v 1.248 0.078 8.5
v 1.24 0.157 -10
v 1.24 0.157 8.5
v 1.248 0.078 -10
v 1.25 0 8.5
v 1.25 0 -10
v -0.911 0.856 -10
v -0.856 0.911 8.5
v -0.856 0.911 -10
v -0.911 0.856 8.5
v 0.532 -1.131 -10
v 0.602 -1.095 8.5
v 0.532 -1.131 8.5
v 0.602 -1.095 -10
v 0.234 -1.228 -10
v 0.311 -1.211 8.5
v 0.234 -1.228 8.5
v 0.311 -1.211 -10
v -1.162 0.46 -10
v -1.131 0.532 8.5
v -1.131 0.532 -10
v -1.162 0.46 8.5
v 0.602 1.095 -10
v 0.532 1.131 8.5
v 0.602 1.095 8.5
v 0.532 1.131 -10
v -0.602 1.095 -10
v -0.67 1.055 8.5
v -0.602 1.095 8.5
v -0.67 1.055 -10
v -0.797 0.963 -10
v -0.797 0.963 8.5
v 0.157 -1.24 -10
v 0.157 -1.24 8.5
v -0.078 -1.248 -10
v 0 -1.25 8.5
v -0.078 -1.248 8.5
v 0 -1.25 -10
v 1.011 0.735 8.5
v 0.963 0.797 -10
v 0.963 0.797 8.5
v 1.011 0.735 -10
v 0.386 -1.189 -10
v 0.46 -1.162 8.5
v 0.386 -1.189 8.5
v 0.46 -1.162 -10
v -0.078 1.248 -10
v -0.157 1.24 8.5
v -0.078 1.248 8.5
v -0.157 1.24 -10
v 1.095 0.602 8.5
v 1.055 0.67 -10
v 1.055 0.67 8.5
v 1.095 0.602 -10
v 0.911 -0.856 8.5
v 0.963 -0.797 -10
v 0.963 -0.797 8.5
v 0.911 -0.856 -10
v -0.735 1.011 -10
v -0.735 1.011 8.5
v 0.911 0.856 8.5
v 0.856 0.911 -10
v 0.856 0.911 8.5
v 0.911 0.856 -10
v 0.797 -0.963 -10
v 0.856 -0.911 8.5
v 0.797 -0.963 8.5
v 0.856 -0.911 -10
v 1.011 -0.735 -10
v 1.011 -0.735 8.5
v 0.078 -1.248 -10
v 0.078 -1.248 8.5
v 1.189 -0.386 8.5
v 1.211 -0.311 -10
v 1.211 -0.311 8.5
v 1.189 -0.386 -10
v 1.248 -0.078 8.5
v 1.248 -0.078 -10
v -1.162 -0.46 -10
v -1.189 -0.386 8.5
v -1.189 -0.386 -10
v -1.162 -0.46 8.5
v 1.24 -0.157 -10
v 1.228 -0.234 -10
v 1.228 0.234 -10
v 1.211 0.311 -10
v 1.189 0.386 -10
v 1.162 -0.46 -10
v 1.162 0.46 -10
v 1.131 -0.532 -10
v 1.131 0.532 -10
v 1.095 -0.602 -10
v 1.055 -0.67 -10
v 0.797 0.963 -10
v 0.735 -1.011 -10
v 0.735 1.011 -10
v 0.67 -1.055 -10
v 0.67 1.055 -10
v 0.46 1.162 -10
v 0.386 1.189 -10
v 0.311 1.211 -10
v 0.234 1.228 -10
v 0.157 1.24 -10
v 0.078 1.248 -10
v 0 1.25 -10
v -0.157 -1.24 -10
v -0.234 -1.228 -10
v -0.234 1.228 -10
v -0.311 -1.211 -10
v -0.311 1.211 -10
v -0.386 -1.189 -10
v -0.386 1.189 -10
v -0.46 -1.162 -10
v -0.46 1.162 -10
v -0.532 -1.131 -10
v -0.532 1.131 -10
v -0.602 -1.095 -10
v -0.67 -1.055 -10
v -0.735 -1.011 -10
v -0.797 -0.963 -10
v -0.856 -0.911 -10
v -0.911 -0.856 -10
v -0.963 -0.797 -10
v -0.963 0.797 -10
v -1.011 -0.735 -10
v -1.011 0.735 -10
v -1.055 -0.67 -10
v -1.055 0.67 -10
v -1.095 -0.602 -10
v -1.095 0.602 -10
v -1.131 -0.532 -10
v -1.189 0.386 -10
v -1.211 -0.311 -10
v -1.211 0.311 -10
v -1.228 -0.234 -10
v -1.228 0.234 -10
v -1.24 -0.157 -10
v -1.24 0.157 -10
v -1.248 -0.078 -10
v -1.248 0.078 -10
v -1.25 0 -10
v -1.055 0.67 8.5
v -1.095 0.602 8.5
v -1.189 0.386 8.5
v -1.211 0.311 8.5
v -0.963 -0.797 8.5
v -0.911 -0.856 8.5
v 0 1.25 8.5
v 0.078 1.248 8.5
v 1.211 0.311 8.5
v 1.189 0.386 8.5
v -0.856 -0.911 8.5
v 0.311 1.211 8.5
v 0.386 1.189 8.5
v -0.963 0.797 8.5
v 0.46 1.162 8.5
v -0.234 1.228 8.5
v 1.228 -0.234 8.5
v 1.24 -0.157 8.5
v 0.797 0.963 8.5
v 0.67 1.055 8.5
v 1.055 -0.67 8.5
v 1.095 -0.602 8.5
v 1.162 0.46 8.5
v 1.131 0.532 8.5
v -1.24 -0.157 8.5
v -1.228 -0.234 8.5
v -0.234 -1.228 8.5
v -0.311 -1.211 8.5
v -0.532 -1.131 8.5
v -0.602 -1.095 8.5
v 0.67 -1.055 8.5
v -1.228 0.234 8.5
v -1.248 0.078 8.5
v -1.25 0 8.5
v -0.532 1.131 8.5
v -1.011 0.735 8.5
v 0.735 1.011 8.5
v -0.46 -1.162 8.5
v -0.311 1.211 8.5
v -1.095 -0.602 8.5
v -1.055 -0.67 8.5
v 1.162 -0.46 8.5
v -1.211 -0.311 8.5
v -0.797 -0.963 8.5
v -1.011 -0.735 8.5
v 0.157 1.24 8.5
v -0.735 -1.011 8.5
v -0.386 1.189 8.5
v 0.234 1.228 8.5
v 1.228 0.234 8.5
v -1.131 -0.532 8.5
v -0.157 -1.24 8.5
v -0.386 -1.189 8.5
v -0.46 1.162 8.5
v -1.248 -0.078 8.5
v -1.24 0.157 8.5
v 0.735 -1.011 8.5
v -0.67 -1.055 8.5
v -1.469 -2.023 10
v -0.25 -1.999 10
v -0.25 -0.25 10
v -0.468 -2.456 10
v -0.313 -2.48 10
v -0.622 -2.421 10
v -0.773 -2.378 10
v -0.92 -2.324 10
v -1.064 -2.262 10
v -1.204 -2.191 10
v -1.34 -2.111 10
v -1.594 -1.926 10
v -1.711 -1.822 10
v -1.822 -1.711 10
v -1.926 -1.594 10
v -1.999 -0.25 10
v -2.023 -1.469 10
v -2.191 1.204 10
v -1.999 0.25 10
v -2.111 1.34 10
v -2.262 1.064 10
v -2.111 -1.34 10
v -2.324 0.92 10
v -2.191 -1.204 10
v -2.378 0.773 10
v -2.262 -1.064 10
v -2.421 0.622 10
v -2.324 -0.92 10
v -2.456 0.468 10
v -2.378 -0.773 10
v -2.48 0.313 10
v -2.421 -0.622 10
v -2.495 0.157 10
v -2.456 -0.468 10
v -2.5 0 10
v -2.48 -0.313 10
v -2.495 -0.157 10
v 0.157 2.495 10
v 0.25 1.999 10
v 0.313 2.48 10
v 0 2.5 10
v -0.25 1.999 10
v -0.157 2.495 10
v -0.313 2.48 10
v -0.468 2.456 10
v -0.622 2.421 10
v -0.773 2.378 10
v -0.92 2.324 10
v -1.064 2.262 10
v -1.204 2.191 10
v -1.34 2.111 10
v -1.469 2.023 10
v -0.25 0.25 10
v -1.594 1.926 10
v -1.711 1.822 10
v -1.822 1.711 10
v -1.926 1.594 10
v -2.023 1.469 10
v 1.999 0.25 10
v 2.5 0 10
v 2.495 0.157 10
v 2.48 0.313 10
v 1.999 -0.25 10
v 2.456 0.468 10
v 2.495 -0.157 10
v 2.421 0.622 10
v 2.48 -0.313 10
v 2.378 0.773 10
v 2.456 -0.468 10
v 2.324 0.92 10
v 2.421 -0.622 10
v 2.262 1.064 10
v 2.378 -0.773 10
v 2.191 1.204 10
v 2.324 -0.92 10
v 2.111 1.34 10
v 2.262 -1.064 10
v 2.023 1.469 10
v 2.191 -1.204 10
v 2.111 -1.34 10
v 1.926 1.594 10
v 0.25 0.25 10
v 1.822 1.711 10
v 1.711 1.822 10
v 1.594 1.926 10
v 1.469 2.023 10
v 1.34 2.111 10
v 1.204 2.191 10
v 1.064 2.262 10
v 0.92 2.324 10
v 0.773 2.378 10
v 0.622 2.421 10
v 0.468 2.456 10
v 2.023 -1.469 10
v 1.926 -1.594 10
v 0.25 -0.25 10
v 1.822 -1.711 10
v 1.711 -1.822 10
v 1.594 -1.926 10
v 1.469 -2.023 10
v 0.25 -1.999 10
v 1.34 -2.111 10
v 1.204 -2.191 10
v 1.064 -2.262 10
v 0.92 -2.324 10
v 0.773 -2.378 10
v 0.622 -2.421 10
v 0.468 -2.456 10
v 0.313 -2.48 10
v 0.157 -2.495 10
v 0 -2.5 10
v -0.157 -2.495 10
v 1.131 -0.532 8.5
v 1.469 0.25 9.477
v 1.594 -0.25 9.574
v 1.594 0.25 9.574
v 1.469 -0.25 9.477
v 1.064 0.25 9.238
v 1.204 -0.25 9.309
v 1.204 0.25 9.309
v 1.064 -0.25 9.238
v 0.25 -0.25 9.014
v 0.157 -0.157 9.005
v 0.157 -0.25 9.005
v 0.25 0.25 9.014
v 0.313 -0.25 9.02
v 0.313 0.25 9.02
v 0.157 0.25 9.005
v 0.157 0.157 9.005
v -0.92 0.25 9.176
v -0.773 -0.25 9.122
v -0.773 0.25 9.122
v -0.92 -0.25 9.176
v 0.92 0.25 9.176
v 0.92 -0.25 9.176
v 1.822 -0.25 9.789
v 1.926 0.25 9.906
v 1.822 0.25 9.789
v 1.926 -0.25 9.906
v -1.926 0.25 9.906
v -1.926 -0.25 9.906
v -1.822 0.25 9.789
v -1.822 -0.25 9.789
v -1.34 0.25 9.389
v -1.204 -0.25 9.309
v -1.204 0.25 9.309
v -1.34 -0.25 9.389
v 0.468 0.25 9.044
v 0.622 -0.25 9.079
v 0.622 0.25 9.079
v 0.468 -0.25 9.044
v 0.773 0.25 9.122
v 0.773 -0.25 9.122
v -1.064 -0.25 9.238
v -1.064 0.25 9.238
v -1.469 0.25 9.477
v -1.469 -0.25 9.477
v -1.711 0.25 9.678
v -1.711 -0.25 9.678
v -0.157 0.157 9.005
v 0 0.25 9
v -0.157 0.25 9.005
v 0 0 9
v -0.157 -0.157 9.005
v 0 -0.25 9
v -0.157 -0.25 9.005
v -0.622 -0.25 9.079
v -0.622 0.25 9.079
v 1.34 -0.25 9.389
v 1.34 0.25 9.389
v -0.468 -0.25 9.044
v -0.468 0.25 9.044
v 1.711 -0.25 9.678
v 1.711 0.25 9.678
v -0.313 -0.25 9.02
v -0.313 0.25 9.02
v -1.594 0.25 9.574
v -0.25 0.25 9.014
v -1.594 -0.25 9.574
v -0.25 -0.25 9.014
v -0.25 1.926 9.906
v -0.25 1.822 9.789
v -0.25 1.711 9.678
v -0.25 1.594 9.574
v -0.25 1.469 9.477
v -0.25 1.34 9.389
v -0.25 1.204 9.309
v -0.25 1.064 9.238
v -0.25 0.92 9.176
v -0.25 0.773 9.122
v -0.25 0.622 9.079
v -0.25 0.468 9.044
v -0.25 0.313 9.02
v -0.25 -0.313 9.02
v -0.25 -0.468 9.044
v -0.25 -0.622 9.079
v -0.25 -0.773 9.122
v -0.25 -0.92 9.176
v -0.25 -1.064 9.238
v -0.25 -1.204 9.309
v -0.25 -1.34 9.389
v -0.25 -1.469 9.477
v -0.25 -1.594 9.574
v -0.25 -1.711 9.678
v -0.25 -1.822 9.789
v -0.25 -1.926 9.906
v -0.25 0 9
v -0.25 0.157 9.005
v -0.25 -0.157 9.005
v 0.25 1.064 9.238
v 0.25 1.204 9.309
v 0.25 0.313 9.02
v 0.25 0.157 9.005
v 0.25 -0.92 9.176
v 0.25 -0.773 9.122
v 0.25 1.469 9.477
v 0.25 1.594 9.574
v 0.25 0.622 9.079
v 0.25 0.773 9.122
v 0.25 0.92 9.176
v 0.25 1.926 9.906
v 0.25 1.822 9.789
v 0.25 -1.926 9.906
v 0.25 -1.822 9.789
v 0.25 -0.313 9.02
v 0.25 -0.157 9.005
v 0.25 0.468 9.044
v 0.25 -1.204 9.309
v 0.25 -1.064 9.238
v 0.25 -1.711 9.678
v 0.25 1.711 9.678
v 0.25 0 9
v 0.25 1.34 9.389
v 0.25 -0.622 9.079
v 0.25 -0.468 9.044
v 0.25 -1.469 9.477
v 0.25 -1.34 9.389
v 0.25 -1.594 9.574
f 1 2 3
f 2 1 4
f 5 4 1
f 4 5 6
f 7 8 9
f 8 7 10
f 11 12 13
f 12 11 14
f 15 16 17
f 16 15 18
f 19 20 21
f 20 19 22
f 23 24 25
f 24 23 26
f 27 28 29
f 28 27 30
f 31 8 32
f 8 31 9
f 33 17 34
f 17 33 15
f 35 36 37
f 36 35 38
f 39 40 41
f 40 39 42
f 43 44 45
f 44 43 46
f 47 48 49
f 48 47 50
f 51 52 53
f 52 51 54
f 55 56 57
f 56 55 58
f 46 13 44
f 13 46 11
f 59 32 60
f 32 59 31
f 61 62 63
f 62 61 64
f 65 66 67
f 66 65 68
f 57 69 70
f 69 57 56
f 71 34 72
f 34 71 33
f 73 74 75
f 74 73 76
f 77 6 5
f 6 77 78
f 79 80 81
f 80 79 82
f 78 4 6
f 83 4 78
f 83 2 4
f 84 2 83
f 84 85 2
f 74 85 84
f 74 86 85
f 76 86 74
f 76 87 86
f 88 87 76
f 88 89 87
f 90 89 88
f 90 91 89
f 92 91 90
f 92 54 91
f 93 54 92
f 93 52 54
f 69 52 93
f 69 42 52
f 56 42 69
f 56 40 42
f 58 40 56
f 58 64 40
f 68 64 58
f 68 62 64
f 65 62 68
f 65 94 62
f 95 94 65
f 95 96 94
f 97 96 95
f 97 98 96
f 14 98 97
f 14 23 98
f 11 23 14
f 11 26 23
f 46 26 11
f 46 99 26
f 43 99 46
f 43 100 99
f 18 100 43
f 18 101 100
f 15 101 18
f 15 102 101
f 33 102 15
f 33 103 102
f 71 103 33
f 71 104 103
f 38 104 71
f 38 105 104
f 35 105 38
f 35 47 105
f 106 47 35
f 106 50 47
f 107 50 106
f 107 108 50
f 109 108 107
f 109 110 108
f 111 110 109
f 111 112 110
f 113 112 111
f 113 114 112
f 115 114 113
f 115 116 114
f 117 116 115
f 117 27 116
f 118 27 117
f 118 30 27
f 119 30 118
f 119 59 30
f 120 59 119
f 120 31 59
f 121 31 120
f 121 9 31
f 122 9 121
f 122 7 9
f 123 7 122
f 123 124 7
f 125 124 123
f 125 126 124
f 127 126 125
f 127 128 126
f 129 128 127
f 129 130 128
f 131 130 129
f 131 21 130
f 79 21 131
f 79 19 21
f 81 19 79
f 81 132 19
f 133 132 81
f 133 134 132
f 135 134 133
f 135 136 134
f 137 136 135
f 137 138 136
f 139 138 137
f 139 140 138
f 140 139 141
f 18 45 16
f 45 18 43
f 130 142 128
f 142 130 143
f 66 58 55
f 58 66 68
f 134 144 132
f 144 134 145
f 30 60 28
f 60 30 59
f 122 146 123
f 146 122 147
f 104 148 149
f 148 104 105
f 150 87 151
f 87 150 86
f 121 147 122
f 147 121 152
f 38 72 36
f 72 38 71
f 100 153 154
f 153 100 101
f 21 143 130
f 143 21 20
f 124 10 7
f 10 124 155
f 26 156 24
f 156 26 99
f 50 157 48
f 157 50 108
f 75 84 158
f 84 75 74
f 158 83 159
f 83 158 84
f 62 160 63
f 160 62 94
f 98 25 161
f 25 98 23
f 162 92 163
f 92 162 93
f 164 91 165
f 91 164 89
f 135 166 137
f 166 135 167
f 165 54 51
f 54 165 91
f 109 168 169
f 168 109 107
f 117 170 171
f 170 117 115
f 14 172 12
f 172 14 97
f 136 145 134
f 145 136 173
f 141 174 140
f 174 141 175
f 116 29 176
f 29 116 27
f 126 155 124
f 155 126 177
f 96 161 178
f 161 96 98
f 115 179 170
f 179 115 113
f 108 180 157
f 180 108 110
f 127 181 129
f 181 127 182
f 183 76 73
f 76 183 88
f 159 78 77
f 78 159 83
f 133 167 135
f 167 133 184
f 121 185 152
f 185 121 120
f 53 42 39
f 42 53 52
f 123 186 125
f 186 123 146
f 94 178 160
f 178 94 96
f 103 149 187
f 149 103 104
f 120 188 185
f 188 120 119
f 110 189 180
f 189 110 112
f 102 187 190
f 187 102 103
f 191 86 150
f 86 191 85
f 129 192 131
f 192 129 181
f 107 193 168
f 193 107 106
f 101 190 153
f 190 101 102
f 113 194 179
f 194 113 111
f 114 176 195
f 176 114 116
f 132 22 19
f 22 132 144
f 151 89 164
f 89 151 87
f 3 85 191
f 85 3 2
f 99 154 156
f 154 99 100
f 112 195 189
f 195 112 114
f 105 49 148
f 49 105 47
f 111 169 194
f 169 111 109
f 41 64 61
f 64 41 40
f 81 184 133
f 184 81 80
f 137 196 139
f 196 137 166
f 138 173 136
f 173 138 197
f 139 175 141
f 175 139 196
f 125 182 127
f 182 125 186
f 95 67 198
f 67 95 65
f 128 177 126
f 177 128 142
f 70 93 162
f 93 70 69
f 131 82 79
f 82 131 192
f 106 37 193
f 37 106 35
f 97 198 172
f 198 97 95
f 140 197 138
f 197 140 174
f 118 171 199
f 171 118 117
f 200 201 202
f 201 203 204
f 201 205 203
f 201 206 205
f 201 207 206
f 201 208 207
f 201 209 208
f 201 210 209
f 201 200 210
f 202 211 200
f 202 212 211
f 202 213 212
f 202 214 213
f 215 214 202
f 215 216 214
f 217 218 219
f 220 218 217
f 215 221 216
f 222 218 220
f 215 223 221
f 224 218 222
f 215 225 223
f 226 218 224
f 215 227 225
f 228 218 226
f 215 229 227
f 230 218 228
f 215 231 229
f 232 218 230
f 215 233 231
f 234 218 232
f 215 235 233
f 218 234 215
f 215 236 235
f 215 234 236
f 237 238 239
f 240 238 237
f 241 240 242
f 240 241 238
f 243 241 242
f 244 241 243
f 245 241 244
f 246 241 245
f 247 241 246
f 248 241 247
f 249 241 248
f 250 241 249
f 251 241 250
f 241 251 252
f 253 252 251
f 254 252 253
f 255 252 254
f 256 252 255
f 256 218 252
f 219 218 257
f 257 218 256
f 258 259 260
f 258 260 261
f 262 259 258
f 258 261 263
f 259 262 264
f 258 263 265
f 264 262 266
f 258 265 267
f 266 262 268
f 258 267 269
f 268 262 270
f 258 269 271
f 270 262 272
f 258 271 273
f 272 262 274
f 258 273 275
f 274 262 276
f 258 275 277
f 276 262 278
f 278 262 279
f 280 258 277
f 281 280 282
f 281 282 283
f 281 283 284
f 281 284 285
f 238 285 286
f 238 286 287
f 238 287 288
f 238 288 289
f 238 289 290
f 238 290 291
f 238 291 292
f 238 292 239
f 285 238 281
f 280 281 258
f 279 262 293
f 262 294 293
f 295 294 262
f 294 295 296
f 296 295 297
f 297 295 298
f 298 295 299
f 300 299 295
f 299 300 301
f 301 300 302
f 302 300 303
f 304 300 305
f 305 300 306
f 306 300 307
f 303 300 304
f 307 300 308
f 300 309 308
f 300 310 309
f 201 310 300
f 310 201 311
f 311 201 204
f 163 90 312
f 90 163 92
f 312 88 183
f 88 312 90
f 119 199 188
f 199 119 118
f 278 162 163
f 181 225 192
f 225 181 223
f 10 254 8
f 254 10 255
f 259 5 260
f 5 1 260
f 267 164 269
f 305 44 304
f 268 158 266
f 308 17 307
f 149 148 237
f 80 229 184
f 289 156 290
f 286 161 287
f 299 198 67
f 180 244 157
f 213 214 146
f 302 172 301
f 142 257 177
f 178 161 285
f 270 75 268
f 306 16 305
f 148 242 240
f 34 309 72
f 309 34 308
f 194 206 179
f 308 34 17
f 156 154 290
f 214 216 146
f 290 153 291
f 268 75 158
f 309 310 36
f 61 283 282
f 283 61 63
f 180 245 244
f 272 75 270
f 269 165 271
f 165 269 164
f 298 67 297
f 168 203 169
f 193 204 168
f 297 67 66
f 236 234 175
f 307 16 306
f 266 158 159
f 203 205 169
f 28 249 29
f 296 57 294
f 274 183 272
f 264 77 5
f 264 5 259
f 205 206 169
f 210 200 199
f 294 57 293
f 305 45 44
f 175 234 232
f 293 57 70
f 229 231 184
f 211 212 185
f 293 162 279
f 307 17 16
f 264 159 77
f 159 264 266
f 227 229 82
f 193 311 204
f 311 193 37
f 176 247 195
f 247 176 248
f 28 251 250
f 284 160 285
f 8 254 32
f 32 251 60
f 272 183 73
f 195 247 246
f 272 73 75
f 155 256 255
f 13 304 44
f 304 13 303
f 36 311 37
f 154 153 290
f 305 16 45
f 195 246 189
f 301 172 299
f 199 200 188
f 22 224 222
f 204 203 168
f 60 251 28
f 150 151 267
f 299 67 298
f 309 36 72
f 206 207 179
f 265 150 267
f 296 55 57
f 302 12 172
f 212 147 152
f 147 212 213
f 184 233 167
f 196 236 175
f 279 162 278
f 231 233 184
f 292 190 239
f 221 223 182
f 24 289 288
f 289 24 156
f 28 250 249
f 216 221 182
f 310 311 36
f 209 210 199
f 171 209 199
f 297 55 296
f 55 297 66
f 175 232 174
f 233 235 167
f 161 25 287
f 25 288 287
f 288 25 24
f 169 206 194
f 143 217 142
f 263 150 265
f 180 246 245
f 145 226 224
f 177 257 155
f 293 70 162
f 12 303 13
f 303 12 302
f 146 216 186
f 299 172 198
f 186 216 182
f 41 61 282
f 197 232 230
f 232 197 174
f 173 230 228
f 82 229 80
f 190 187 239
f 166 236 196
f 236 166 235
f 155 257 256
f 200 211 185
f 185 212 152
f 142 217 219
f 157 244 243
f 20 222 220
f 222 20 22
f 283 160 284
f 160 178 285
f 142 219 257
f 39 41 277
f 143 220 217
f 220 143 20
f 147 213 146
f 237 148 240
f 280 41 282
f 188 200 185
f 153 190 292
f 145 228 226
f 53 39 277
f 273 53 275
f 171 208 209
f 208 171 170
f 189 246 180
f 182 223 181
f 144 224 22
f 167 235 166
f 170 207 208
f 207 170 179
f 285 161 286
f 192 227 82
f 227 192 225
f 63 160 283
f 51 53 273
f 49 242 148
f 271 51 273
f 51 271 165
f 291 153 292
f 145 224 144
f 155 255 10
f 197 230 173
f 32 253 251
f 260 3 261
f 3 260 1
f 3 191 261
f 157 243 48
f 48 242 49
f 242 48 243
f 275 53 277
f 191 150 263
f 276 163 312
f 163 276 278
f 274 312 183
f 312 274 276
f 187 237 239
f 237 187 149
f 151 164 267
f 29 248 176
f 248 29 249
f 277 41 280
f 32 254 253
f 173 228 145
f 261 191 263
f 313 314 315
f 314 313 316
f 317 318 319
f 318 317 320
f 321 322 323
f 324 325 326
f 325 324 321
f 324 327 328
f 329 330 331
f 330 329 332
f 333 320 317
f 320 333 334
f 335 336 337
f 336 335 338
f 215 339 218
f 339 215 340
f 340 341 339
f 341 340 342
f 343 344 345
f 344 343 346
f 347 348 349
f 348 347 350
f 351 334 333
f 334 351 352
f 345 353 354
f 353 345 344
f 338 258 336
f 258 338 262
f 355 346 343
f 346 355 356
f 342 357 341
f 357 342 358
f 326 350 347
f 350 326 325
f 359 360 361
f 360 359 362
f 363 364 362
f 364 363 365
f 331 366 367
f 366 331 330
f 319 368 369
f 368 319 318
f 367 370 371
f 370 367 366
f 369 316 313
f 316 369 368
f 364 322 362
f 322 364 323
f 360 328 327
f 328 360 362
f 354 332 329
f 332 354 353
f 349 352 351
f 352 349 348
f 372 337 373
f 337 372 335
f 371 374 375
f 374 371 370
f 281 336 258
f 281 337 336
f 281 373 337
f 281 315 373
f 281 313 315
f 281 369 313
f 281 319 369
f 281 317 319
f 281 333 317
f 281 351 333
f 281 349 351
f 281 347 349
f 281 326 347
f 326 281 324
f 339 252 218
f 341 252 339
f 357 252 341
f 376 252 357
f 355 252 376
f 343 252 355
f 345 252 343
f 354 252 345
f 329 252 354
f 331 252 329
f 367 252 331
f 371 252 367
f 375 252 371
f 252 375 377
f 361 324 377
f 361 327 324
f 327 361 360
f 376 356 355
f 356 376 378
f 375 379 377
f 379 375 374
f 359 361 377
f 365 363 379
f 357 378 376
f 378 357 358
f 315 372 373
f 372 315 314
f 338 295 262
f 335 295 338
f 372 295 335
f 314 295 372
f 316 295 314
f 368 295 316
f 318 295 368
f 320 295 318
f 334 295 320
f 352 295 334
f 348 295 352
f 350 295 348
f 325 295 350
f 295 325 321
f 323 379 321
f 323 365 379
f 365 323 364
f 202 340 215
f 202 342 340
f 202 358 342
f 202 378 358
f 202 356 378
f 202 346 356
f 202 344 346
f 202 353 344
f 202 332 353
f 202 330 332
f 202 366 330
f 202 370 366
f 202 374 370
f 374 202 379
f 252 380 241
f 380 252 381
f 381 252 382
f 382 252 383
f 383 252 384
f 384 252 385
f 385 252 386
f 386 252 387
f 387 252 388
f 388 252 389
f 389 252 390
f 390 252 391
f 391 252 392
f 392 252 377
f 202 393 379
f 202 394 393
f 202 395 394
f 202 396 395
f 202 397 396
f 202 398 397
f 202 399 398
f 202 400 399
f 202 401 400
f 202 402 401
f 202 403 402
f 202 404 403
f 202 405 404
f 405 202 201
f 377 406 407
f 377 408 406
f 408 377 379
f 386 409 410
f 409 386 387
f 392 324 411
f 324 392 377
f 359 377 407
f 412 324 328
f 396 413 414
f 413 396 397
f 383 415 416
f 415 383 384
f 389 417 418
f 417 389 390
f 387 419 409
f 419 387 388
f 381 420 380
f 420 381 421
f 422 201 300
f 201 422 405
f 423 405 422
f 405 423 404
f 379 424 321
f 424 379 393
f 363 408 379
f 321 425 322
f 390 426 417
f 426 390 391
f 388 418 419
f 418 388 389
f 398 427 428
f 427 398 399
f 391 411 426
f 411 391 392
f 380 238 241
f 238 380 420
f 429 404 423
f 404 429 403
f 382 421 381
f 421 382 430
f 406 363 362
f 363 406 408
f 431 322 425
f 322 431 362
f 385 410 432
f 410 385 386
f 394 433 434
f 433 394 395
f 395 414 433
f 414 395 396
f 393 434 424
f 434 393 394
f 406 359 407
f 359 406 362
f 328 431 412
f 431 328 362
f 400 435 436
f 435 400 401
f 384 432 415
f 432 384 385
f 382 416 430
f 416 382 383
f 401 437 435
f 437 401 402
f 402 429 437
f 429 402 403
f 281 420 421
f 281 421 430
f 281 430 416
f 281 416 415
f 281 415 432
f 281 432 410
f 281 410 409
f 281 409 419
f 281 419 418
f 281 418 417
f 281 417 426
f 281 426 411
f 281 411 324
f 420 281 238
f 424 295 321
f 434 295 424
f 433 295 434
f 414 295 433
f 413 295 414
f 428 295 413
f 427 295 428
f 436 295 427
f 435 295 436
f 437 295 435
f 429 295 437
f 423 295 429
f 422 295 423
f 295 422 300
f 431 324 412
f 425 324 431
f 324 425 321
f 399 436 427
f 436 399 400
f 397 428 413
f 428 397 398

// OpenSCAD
module make_screw(length, head_height=1.5, d=2.5){
    difference(){
        union(){
            cylinder(d=d, h=length, center=true, $fn=100);
            translate([0,0,length/2-head_height/2])
            cylinder(r1=d/2, r2=d, h=head_height, center=true, $fn=100);
        }
                
        for(i=[0:1])
        translate([0,0,length*.5+1.5])
        rotate([90,0,90*i])
        cylinder(d=5, h=.5, center=true, $fn=100);
    }
}

module make_screw_10(){
    make_screw(length=10);
}

module make_screw_15(){
    make_screw(length=15);
}

module make_screw_20(){
    make_screw(length=20);
}

//make_screw_10();

//make_screw_15();

make_screw_20();
